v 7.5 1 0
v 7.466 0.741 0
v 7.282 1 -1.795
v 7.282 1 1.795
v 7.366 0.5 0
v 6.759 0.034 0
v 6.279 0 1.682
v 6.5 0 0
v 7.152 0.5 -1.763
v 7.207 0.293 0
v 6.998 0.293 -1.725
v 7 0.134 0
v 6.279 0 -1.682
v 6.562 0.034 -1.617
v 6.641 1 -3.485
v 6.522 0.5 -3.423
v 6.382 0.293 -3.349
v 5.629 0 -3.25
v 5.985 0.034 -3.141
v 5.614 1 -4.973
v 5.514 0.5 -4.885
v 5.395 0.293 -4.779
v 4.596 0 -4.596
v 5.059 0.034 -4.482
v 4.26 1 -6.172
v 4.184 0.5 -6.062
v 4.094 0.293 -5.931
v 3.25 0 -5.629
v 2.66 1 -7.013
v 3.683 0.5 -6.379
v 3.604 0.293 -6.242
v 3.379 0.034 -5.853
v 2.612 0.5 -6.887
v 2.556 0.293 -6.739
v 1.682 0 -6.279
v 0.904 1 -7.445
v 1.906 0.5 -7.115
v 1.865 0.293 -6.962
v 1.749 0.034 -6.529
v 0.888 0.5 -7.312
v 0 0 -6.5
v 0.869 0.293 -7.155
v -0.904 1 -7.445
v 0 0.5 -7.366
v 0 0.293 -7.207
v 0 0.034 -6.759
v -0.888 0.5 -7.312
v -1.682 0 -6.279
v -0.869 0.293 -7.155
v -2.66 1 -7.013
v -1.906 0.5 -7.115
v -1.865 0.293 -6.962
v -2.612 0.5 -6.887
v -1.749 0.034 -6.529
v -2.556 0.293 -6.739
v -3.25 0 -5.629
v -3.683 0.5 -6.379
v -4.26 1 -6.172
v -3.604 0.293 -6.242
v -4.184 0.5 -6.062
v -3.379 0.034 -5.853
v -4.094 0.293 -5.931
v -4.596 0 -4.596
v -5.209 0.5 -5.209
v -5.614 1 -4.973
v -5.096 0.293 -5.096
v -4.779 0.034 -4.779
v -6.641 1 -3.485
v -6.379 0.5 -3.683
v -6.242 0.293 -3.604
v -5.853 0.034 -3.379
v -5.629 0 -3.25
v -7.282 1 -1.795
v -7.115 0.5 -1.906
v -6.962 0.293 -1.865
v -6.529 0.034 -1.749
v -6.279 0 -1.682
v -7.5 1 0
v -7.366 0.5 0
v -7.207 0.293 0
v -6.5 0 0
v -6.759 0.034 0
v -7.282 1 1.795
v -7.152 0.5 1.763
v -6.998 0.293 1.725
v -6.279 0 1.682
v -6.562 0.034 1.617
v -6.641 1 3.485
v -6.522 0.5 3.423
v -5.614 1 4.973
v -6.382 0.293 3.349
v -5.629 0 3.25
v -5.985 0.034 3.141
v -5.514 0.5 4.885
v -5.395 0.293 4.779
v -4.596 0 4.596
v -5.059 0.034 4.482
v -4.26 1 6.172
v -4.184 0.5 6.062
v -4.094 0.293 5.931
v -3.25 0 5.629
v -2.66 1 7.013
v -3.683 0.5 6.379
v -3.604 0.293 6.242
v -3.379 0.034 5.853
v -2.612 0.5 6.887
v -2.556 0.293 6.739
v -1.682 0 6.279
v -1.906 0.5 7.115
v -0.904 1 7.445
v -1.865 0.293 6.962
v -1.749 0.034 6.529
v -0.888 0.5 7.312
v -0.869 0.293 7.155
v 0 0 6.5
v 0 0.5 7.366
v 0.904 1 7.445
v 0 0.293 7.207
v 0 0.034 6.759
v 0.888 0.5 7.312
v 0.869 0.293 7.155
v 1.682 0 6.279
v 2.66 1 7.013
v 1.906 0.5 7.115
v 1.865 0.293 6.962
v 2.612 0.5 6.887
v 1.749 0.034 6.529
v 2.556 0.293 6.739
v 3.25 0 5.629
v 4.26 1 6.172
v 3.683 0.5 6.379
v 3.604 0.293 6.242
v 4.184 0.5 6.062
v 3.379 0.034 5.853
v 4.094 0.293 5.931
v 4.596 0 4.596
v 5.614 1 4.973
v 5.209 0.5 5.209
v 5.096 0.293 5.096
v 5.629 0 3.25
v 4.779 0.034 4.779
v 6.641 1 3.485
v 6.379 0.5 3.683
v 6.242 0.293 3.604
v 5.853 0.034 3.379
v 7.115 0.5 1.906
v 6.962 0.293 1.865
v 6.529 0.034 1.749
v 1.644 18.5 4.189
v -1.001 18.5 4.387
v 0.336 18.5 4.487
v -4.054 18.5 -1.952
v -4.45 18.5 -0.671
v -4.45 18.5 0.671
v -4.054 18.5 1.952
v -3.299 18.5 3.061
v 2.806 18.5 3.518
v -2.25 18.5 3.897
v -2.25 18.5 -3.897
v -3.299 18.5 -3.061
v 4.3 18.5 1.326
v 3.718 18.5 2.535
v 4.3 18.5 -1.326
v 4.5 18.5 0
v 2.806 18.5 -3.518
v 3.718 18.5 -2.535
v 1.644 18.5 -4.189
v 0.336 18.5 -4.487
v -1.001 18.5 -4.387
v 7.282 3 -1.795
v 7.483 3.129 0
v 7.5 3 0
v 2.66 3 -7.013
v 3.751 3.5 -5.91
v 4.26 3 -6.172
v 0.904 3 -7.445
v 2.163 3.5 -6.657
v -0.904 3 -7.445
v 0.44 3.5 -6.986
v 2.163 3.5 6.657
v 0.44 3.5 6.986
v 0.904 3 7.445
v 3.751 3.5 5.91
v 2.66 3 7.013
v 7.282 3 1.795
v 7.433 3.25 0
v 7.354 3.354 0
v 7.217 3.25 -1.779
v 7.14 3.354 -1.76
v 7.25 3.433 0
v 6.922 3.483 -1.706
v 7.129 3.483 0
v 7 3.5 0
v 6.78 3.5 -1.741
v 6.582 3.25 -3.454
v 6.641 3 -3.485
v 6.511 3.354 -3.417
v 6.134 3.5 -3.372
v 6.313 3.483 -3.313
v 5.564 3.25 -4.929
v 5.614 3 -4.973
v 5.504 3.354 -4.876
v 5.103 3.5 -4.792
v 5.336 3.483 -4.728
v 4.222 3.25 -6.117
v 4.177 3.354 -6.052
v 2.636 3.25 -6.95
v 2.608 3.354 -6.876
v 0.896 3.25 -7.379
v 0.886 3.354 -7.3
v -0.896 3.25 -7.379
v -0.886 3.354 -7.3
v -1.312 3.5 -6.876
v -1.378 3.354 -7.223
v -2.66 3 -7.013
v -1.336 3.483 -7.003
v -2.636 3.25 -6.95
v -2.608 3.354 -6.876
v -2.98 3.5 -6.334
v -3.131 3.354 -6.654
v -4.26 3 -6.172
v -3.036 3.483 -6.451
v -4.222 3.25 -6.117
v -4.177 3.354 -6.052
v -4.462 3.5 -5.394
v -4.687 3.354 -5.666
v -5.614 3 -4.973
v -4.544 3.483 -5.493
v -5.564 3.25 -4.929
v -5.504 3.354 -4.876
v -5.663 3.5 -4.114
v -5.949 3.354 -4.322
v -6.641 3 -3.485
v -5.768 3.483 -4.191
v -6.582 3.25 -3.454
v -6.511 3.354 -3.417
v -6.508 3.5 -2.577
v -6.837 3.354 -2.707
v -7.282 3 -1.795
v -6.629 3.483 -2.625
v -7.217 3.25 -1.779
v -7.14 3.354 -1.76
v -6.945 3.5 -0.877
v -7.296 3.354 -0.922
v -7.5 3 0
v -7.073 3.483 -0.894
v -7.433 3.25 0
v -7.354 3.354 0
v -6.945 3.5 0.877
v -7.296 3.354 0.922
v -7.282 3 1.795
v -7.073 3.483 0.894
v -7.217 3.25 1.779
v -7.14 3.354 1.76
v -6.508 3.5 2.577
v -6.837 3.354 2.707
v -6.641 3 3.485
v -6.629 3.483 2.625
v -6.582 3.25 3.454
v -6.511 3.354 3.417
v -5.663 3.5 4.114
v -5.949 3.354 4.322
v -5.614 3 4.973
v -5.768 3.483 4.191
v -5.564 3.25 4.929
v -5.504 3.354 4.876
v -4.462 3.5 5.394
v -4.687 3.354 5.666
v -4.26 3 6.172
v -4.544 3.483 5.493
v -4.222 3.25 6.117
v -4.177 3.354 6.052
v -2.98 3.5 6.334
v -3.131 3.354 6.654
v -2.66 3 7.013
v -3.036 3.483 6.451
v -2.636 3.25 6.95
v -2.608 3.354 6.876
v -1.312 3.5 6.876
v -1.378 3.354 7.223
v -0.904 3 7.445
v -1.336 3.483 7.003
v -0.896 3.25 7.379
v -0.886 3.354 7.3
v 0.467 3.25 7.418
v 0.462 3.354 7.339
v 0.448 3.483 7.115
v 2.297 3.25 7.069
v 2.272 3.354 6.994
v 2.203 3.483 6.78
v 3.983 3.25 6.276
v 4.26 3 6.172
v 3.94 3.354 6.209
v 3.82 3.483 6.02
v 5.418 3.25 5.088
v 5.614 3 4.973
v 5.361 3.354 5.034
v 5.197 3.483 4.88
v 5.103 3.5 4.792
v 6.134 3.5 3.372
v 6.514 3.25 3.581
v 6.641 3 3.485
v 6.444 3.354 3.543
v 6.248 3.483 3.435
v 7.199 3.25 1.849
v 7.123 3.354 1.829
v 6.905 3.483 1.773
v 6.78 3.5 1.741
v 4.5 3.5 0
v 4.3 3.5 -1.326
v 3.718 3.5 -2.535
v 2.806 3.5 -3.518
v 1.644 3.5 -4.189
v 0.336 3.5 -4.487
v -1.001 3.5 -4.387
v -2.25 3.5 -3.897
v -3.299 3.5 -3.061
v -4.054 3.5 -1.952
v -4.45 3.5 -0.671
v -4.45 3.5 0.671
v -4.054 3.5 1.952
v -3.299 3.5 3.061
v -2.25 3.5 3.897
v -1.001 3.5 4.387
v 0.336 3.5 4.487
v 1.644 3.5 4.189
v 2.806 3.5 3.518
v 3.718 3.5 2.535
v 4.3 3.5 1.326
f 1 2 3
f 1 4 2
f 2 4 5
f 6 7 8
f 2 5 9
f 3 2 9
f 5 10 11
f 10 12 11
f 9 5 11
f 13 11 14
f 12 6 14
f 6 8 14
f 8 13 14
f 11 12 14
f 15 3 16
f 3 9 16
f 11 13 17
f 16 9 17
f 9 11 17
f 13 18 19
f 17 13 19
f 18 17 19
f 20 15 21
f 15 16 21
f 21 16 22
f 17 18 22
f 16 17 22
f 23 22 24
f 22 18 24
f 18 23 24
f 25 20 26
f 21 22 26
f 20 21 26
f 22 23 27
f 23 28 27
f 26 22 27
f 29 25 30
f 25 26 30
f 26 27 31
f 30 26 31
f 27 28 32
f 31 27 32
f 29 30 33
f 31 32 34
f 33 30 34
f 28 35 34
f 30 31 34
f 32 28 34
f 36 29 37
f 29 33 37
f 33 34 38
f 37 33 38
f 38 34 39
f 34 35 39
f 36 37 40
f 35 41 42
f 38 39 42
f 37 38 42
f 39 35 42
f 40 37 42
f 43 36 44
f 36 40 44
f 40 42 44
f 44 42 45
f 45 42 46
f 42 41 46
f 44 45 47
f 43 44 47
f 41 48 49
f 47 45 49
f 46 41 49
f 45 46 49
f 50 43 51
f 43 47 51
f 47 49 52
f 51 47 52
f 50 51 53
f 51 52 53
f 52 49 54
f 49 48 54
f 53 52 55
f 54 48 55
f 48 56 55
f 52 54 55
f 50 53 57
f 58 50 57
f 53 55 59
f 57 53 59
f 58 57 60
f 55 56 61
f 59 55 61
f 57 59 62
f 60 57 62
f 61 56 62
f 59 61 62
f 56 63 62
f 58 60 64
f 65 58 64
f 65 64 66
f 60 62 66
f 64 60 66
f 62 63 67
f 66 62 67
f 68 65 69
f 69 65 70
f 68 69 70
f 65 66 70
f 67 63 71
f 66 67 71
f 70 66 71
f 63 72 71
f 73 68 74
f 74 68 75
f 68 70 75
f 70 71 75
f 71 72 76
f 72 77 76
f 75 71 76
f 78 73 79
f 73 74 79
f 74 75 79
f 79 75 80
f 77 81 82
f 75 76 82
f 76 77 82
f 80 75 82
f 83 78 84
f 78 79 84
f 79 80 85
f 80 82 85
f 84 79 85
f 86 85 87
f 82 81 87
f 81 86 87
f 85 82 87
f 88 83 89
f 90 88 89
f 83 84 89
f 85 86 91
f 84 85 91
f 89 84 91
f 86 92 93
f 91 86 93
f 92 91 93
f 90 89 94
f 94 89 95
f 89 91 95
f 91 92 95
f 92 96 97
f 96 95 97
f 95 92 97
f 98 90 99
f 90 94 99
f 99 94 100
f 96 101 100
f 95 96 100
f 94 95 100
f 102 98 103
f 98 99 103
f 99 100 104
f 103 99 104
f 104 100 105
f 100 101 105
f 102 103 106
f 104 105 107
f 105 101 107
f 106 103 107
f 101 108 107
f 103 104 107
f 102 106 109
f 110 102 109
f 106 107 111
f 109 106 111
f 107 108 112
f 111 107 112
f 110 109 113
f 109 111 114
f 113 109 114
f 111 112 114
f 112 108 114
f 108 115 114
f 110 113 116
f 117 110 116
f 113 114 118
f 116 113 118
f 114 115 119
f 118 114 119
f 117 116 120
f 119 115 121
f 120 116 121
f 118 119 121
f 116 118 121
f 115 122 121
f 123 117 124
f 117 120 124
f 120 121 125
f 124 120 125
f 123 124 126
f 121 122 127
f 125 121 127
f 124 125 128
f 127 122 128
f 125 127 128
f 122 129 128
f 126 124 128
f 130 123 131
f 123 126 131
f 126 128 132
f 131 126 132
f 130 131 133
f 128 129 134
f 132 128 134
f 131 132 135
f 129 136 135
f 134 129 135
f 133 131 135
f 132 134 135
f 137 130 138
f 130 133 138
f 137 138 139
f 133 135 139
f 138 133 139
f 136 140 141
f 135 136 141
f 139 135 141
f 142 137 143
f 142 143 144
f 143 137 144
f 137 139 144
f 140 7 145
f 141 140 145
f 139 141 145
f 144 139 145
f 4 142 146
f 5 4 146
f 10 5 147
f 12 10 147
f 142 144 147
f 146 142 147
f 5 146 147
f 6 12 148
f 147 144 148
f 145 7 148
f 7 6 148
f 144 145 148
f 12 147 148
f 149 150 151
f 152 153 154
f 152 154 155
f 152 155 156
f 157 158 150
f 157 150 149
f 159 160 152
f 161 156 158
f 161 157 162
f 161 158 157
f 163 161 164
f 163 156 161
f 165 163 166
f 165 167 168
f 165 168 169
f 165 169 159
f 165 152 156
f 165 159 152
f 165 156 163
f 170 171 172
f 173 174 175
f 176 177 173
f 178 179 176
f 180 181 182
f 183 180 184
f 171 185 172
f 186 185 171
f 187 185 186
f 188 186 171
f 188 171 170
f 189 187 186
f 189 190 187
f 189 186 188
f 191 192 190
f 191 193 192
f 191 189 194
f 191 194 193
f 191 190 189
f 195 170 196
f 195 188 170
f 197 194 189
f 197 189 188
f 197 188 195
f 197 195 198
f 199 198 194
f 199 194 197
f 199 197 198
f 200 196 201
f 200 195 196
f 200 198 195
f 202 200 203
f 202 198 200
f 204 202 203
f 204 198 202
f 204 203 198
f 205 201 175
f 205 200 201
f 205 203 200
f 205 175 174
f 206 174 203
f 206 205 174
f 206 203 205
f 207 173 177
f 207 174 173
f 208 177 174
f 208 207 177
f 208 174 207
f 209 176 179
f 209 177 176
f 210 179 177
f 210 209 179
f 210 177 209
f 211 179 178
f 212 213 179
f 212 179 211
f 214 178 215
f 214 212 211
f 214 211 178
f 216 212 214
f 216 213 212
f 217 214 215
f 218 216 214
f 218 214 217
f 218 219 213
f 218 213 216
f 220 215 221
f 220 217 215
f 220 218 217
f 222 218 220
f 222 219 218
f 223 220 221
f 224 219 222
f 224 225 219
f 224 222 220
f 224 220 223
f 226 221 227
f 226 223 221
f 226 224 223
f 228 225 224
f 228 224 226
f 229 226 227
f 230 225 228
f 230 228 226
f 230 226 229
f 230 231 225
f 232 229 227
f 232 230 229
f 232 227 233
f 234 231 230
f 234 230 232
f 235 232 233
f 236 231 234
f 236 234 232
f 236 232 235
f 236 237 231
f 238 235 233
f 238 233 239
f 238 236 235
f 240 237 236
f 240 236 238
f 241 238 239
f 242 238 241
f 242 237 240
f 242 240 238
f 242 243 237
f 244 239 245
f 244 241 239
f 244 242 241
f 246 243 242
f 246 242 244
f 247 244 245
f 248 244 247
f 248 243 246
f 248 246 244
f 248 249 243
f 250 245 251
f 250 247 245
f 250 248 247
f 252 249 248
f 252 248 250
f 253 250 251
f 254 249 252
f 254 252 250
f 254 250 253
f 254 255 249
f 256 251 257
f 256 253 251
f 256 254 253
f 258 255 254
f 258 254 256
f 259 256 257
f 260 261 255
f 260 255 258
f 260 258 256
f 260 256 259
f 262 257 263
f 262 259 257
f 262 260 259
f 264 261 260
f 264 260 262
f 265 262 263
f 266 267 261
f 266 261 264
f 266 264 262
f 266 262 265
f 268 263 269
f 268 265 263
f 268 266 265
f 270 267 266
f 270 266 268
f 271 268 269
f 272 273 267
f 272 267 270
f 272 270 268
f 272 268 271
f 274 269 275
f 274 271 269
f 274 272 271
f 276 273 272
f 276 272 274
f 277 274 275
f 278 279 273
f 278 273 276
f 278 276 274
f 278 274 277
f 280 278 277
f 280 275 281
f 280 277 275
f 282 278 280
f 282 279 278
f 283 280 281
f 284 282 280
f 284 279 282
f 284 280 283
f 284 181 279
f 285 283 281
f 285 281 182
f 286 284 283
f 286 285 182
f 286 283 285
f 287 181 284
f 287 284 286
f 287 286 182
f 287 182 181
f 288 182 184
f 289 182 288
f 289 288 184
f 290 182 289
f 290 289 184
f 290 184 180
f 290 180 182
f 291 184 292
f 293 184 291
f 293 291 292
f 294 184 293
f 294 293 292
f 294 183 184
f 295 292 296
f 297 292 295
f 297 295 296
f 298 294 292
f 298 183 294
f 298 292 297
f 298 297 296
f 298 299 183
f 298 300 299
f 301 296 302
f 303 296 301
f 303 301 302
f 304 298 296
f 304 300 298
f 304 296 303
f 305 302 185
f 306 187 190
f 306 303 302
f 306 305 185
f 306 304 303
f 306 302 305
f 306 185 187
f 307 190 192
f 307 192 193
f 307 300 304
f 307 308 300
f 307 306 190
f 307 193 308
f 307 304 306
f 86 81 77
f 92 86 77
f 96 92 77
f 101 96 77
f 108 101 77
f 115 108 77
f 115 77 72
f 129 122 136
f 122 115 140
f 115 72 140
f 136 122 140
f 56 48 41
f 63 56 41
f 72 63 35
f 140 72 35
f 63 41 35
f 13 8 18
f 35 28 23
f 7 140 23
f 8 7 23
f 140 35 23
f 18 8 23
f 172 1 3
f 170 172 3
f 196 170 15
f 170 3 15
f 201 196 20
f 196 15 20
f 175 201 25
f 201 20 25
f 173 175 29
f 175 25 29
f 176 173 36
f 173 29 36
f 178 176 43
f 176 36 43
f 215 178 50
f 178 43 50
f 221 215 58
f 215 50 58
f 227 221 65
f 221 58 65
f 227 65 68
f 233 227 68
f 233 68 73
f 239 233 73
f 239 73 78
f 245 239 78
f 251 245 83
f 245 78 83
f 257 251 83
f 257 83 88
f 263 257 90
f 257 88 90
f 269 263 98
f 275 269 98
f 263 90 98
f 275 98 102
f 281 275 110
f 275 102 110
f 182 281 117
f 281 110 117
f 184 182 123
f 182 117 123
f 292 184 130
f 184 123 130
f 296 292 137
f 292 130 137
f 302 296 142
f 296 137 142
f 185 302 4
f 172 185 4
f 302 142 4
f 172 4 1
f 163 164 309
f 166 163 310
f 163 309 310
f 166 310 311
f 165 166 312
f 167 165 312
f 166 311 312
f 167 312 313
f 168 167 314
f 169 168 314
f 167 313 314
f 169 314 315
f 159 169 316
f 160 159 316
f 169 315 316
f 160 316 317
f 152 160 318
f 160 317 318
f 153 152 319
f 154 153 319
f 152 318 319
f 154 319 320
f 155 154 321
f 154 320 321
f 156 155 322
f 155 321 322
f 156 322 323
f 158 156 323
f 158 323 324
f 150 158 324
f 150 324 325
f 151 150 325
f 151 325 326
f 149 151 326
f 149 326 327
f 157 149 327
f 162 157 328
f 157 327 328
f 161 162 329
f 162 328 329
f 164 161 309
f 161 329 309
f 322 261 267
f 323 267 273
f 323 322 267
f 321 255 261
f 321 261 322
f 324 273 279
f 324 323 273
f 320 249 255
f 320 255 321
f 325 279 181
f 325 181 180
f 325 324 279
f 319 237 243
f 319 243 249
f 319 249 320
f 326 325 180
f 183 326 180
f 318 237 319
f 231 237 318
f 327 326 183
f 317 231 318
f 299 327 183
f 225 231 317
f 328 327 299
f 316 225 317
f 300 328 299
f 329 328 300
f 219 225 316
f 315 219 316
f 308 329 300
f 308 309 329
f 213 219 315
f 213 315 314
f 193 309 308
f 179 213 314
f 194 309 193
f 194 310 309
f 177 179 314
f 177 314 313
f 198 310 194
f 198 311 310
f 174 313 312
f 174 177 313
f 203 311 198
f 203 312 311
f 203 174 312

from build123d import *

# Parameters (mm, degrees)
SKETCH2_R           = 7.5
BOSS_EXTRUDE1_DEPTH = 3.5
SKETCH3_R           = 4.5
BOSS_EXTRUDE2_DEPTH = 15
FILLET1_R           = 1
FILLET2_R           = 0.5


with BuildPart() as part:
    # Sketch2 → Boss-Extrude1 (new body)
    with BuildSketch(Plane(origin=(0, 0, 0), x_dir=(1, 0, 0), z_dir=(0, 1, 0))):
        Circle(SKETCH2_R)
    extrude(amount=BOSS_EXTRUDE1_DEPTH)

    # Sketch3 → Boss-Extrude2 (add)
    with BuildSketch(Plane(origin=(0, 3.5, 0), x_dir=(1, 0, 0), z_dir=(0, 1, 0))):
        Circle(SKETCH3_R)
    extrude(amount=BOSS_EXTRUDE2_DEPTH)

    # Fillet1
    fillet1_edges = [part.edges().sort_by_distance(p)[0] for p in [
        (-7.5, 0, 0),
    ]]
    fillet(fillet1_edges, radius=FILLET1_R)

    # Fillet2
    fillet2_edges = [part.edges().sort_by_distance(p)[0] for p in [
        (-7.5, 3.5, 0),
    ]]
    fillet(fillet2_edges, radius=FILLET2_R)


solid = part.part
